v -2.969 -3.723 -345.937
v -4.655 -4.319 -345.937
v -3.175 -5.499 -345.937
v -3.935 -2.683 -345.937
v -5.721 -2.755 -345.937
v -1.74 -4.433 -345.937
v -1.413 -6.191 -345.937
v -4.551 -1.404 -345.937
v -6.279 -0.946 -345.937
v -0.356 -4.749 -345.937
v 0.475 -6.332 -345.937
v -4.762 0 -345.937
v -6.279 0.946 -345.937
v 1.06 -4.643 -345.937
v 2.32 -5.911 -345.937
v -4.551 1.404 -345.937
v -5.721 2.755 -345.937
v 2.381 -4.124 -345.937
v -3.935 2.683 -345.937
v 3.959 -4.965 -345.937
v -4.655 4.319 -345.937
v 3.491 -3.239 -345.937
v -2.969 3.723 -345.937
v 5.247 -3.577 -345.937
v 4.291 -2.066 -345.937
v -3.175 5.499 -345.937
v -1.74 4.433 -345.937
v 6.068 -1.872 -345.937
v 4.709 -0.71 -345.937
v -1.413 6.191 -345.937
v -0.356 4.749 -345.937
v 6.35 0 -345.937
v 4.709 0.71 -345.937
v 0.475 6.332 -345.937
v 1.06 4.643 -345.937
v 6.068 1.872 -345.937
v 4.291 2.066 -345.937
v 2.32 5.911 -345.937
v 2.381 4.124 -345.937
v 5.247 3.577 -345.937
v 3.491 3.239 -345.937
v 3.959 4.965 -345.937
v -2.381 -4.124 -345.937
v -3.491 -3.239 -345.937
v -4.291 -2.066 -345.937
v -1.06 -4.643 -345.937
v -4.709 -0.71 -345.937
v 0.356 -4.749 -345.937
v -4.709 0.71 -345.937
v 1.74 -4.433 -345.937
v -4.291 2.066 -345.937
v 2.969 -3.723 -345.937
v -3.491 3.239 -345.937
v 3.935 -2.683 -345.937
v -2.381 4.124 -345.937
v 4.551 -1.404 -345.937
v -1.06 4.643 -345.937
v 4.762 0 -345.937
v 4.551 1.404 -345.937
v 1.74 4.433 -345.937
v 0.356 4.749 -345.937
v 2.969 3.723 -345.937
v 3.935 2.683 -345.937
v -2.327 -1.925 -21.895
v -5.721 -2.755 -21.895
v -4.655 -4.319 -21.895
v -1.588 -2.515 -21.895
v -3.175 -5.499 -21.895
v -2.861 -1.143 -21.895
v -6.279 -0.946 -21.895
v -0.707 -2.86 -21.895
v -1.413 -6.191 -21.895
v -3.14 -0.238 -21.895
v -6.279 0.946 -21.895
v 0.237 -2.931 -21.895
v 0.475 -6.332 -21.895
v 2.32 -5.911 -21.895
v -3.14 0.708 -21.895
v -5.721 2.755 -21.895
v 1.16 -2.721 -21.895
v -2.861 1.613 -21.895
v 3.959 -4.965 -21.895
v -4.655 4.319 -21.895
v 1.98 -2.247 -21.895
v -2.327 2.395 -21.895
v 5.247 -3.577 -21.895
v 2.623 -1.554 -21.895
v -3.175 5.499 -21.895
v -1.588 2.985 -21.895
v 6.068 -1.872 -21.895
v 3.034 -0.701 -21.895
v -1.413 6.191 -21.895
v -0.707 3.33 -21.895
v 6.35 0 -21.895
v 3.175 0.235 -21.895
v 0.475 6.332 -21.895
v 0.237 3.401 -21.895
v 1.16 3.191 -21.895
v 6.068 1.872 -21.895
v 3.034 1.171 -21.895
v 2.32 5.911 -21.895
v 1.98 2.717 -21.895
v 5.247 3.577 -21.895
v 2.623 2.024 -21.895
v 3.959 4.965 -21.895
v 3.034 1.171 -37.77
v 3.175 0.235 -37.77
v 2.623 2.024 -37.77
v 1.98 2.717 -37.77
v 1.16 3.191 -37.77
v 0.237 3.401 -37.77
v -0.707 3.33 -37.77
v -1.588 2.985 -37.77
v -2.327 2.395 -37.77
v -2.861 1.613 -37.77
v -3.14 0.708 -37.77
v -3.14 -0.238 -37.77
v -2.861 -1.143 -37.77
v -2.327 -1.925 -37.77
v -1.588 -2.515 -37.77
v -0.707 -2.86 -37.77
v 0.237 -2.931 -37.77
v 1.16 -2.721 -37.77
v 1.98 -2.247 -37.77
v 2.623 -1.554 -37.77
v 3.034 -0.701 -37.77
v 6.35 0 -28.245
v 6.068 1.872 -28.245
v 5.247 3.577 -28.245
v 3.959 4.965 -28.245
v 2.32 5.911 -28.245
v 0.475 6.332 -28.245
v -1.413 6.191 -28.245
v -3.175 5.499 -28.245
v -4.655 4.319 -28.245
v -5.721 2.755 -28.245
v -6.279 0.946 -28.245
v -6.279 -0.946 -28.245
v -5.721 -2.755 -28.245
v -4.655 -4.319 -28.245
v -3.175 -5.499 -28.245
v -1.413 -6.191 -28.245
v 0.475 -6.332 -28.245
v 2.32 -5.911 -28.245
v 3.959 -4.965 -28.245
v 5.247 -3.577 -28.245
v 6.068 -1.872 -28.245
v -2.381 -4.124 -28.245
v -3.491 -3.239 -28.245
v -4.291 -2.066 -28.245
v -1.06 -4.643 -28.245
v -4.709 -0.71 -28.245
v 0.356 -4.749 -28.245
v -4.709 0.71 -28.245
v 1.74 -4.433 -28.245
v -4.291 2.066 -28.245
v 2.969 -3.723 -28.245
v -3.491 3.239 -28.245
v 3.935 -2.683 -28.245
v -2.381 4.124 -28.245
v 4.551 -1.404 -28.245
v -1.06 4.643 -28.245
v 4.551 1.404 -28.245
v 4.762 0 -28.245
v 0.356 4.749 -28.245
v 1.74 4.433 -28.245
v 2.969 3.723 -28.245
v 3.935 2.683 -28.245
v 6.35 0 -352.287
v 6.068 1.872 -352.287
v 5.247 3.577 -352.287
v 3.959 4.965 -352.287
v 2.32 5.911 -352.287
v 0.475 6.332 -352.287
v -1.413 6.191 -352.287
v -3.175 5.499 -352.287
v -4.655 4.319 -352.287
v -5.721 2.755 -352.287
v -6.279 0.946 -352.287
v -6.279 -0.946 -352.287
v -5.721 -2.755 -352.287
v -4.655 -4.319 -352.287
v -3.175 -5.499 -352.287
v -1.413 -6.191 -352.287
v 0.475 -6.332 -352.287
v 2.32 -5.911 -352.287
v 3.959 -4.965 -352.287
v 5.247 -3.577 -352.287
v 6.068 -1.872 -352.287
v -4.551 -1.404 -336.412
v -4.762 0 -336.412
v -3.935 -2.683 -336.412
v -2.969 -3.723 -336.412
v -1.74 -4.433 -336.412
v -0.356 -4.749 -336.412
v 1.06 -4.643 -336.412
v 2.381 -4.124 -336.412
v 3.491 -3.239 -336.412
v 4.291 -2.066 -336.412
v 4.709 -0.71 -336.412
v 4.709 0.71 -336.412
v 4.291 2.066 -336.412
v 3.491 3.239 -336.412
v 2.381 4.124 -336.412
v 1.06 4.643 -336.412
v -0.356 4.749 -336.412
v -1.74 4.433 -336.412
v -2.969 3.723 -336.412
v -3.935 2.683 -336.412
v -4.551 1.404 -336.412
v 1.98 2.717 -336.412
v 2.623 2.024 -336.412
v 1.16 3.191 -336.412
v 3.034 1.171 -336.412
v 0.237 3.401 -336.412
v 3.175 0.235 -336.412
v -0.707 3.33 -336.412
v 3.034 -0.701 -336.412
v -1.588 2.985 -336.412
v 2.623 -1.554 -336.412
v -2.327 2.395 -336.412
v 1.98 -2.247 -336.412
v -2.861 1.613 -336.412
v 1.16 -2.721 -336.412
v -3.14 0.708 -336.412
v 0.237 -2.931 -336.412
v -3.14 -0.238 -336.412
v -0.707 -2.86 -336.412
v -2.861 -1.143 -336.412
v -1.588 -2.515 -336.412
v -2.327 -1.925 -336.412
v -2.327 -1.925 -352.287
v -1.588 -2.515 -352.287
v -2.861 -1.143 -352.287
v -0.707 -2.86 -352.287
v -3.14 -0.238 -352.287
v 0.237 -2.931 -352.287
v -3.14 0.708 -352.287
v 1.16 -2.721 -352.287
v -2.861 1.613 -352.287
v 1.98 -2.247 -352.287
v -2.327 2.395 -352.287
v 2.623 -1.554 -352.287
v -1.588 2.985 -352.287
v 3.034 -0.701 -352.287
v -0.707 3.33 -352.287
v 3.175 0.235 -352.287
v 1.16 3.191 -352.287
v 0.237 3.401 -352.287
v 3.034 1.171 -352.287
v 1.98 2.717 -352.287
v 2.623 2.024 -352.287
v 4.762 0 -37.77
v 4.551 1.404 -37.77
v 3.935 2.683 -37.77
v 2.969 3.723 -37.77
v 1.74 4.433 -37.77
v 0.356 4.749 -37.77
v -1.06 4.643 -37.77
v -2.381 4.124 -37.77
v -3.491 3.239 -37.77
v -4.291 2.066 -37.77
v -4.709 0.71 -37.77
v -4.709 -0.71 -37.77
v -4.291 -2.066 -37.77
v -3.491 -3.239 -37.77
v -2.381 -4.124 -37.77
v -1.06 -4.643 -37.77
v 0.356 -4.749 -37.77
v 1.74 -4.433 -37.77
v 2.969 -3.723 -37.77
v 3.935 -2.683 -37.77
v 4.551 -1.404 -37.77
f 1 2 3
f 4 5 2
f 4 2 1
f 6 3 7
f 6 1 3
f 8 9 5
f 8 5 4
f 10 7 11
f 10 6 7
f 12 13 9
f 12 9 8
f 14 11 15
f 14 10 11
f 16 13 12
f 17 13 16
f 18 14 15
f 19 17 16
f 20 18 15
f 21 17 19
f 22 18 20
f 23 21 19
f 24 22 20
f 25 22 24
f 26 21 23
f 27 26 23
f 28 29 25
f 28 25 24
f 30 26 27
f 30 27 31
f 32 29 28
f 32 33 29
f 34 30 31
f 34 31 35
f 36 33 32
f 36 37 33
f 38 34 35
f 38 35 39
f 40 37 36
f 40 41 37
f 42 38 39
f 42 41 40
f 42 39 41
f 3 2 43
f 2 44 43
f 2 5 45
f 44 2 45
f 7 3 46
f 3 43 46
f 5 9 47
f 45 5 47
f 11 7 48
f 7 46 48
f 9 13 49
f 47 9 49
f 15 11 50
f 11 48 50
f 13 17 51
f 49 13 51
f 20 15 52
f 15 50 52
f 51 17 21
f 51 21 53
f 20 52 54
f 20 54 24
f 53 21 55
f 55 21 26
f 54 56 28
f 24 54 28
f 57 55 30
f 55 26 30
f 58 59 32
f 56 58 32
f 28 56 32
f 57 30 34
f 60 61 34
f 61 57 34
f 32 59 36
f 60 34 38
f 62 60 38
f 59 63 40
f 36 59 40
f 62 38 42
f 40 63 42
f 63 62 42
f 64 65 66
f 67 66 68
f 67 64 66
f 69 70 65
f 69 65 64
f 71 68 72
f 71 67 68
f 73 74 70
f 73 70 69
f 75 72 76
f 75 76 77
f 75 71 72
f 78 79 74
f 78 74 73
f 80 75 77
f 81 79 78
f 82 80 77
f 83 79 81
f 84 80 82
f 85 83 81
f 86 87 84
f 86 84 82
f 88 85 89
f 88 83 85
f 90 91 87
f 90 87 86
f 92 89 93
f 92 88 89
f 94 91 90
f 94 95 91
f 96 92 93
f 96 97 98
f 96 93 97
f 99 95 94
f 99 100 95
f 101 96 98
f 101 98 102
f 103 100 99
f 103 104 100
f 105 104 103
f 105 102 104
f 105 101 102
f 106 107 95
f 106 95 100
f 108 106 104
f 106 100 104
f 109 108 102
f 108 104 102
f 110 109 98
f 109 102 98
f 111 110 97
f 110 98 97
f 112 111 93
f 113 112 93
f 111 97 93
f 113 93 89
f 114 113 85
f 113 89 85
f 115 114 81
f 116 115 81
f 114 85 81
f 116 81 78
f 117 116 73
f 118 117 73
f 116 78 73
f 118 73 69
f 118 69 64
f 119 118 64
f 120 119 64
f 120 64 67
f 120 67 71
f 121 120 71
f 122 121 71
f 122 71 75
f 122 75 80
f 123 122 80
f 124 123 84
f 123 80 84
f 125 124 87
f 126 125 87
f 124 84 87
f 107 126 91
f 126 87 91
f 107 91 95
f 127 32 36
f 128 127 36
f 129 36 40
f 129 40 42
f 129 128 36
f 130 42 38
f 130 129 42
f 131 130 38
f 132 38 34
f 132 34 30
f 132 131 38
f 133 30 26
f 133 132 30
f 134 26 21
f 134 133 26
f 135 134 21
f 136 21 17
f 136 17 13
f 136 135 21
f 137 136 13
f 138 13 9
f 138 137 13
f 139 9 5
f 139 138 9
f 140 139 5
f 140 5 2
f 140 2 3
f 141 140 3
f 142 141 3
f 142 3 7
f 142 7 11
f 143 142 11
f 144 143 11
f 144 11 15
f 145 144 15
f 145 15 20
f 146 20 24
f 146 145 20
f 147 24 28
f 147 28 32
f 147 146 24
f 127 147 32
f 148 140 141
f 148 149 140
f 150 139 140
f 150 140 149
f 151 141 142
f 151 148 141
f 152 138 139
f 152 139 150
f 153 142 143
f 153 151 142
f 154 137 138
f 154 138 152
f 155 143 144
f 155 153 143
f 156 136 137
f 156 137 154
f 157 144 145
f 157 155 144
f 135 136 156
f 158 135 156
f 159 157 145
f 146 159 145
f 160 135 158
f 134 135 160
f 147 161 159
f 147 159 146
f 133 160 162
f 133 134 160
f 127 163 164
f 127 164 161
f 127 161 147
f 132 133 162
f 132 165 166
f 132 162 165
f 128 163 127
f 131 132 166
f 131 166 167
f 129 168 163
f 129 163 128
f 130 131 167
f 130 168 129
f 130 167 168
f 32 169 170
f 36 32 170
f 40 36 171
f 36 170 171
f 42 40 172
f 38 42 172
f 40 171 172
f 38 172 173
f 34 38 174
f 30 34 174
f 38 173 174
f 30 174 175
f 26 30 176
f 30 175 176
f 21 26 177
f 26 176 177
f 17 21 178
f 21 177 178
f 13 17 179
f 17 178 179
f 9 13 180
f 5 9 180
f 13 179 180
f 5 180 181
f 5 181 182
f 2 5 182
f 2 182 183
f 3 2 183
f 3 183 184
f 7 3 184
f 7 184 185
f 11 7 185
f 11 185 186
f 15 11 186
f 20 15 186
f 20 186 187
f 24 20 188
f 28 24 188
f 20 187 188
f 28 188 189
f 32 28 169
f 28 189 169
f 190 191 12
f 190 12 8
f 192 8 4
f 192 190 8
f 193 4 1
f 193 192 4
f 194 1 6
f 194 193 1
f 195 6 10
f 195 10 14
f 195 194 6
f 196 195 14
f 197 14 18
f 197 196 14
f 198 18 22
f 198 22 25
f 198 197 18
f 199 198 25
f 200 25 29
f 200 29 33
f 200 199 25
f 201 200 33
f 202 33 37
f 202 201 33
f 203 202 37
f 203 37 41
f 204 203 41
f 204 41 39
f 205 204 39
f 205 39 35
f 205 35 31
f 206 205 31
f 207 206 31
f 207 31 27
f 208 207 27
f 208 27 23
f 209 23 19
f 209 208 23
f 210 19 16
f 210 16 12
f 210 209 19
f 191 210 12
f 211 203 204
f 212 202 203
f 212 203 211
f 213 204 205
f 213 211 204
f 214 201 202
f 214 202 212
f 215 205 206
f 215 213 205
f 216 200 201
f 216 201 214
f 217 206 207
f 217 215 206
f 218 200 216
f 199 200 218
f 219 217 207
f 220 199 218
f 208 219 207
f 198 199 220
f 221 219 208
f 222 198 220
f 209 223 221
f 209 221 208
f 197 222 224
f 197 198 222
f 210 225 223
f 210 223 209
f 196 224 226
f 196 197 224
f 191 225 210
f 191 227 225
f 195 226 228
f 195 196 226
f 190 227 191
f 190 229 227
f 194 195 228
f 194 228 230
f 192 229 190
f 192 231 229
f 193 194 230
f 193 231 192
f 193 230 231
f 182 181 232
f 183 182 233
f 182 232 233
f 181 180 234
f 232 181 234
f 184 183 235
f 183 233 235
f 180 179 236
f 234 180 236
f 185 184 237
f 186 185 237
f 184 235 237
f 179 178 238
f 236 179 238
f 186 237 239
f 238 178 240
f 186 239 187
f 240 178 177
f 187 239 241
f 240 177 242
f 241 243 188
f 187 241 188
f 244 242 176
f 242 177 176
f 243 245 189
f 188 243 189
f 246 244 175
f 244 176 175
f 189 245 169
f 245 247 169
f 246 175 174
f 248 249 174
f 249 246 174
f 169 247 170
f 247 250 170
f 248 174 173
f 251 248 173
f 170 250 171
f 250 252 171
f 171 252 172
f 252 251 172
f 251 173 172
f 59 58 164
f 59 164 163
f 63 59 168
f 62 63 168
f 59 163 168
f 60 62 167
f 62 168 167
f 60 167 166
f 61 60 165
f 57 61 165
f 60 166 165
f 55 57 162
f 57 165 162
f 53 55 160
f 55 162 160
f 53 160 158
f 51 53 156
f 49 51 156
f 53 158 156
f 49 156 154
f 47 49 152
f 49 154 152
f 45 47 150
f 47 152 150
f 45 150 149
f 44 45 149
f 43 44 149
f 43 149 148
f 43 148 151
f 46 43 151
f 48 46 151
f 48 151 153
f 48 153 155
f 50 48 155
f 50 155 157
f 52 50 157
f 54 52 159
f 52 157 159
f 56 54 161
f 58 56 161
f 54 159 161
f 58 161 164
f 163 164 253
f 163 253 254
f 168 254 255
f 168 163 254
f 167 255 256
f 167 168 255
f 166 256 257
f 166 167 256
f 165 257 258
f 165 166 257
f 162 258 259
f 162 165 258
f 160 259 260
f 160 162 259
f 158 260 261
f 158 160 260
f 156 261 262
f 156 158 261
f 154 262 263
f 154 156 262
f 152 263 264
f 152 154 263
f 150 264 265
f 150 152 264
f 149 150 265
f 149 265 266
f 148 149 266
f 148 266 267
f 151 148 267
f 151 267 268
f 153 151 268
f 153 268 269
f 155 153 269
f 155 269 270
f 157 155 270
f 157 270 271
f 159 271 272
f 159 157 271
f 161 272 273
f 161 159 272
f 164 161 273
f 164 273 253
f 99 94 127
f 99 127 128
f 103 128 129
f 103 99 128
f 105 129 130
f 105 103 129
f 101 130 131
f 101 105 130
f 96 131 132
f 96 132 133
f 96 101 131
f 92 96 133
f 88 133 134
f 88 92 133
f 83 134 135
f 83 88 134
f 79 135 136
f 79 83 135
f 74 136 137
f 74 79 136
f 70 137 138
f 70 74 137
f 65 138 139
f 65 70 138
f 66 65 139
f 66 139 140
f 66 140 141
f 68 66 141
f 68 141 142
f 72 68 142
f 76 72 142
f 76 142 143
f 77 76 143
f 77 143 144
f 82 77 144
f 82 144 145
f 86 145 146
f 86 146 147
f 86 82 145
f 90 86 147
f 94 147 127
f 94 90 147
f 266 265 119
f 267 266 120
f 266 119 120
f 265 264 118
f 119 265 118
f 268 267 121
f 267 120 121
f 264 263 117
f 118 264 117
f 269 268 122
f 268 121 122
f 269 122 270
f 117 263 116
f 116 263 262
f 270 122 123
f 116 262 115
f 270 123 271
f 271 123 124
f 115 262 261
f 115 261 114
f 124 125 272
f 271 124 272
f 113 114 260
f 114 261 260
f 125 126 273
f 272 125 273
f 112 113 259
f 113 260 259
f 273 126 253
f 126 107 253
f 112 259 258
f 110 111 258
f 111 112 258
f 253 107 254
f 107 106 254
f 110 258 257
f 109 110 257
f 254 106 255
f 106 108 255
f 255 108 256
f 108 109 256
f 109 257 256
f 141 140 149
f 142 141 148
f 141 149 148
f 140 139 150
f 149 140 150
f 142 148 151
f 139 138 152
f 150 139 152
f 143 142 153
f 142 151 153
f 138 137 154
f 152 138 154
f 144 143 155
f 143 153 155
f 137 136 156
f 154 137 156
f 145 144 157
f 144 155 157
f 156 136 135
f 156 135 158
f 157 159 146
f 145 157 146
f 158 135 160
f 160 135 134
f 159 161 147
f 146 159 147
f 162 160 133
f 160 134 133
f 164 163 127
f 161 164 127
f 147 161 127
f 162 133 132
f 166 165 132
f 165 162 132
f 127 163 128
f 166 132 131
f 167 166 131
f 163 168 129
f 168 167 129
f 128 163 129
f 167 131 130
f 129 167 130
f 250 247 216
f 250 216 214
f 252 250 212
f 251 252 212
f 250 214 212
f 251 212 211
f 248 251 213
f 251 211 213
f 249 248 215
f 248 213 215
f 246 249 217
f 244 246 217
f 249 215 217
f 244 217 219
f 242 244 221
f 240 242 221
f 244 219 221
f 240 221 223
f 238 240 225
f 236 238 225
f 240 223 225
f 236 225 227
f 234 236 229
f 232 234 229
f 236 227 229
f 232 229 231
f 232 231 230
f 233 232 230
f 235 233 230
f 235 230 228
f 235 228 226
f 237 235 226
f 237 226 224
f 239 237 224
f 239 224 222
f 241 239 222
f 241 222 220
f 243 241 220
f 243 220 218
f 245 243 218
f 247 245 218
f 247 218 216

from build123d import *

# Parameters (mm, degrees)
THREADED_START            = -21.8948
SKETCH2_R                 = 6.35
SKETCH2_R_2               = 4.7625
SKETCH2_R_3               = 3.175
THREADED_INSERT_1_1_DEPTH = 6.35
THREADED_START_2          = -28.2448
SKETCH2_5_R               = 4.7625
SKETCH2_5_R_2             = 3.175
THREADED_INSERT_1_2_DEPTH = 9.525
BOSS_EXTRUDE4_START       = -352.287312
SKETCH2_7_R               = 6.35
SKETCH2_7_R_2             = 4.7625
SKETCH2_7_R_3             = 3.175
BOSS_EXTRUDE4_DEPTH       = 6.35
BOSS_EXTRUDE5_START       = -336.412312
SKETCH2_8_R               = 4.7625
SKETCH2_8_R_2             = 3.175
BOSS_EXTRUDE5_DEPTH       = 9.525
BOSS_EXTRUDE6_START       = -28.2448
SKETCH2_9_R               = 6.35
SKETCH2_9_R_2             = 4.7625
BOSS_EXTRUDE6_DEPTH       = 317.692511614


with BuildPart() as part:
    # Sketch2 → Threaded Insert 1-1 (new body)
    # profile 1 of 2: a face of its own
    with BuildSketch(Plane.XY.offset(THREADED_START)):
        Circle(SKETCH2_R)
        Circle(SKETCH2_R_2, mode=Mode.SUBTRACT)
    # profile 2 of 2: a face of its own
    with BuildSketch(Plane.XY.offset(THREADED_START)):
        Circle(SKETCH2_R_2)
        with Locations((0, 0.235008439)):
            Circle(SKETCH2_R_3, mode=Mode.SUBTRACT)
    extrude(amount=-THREADED_INSERT_1_1_DEPTH)

    # Sketch2<5> → Threaded Insert 1-2 (add)
    with BuildSketch(Plane.XY.offset(THREADED_START_2)):
        Circle(SKETCH2_5_R)
        with Locations((0, 0.235008439)):
            Circle(SKETCH2_5_R_2, mode=Mode.SUBTRACT)
    extrude(amount=-THREADED_INSERT_1_2_DEPTH)


with BuildPart() as body_2:
    # Sketch2<7> → Boss-Extrude4 (new body)
    # profile 1 of 2: a face of its own
    with BuildSketch(Plane.XY.offset(BOSS_EXTRUDE4_START)):
        Circle(SKETCH2_7_R)
        Circle(SKETCH2_7_R_2, mode=Mode.SUBTRACT)
    # profile 2 of 2: a face of its own
    with BuildSketch(Plane.XY.offset(BOSS_EXTRUDE4_START)):
        Circle(SKETCH2_7_R_2)
        with Locations((0, 0.235008439)):
            Circle(SKETCH2_7_R_3, mode=Mode.SUBTRACT)
    extrude(amount=BOSS_EXTRUDE4_DEPTH)

    # Sketch2<8> → Boss-Extrude5 (add)
    with BuildSketch(Plane.XY.offset(BOSS_EXTRUDE5_START)):
        with Locations(Location((0, 0, 0), (0, 0, 180))):
            Circle(SKETCH2_8_R)
        with Locations((0, 0.235008439)):
            Circle(SKETCH2_8_R_2, mode=Mode.SUBTRACT)
    extrude(amount=-BOSS_EXTRUDE5_DEPTH)


with BuildPart() as body_3:
    # Sketch2<9> → Boss-Extrude6 (new body)
    with BuildSketch(Plane.XY.offset(BOSS_EXTRUDE6_START)):
        Circle(SKETCH2_9_R)
        Circle(SKETCH2_9_R_2, mode=Mode.SUBTRACT)
    extrude(amount=-BOSS_EXTRUDE6_DEPTH)


solid = Compound([part.part, body_2.part, body_3.part])
